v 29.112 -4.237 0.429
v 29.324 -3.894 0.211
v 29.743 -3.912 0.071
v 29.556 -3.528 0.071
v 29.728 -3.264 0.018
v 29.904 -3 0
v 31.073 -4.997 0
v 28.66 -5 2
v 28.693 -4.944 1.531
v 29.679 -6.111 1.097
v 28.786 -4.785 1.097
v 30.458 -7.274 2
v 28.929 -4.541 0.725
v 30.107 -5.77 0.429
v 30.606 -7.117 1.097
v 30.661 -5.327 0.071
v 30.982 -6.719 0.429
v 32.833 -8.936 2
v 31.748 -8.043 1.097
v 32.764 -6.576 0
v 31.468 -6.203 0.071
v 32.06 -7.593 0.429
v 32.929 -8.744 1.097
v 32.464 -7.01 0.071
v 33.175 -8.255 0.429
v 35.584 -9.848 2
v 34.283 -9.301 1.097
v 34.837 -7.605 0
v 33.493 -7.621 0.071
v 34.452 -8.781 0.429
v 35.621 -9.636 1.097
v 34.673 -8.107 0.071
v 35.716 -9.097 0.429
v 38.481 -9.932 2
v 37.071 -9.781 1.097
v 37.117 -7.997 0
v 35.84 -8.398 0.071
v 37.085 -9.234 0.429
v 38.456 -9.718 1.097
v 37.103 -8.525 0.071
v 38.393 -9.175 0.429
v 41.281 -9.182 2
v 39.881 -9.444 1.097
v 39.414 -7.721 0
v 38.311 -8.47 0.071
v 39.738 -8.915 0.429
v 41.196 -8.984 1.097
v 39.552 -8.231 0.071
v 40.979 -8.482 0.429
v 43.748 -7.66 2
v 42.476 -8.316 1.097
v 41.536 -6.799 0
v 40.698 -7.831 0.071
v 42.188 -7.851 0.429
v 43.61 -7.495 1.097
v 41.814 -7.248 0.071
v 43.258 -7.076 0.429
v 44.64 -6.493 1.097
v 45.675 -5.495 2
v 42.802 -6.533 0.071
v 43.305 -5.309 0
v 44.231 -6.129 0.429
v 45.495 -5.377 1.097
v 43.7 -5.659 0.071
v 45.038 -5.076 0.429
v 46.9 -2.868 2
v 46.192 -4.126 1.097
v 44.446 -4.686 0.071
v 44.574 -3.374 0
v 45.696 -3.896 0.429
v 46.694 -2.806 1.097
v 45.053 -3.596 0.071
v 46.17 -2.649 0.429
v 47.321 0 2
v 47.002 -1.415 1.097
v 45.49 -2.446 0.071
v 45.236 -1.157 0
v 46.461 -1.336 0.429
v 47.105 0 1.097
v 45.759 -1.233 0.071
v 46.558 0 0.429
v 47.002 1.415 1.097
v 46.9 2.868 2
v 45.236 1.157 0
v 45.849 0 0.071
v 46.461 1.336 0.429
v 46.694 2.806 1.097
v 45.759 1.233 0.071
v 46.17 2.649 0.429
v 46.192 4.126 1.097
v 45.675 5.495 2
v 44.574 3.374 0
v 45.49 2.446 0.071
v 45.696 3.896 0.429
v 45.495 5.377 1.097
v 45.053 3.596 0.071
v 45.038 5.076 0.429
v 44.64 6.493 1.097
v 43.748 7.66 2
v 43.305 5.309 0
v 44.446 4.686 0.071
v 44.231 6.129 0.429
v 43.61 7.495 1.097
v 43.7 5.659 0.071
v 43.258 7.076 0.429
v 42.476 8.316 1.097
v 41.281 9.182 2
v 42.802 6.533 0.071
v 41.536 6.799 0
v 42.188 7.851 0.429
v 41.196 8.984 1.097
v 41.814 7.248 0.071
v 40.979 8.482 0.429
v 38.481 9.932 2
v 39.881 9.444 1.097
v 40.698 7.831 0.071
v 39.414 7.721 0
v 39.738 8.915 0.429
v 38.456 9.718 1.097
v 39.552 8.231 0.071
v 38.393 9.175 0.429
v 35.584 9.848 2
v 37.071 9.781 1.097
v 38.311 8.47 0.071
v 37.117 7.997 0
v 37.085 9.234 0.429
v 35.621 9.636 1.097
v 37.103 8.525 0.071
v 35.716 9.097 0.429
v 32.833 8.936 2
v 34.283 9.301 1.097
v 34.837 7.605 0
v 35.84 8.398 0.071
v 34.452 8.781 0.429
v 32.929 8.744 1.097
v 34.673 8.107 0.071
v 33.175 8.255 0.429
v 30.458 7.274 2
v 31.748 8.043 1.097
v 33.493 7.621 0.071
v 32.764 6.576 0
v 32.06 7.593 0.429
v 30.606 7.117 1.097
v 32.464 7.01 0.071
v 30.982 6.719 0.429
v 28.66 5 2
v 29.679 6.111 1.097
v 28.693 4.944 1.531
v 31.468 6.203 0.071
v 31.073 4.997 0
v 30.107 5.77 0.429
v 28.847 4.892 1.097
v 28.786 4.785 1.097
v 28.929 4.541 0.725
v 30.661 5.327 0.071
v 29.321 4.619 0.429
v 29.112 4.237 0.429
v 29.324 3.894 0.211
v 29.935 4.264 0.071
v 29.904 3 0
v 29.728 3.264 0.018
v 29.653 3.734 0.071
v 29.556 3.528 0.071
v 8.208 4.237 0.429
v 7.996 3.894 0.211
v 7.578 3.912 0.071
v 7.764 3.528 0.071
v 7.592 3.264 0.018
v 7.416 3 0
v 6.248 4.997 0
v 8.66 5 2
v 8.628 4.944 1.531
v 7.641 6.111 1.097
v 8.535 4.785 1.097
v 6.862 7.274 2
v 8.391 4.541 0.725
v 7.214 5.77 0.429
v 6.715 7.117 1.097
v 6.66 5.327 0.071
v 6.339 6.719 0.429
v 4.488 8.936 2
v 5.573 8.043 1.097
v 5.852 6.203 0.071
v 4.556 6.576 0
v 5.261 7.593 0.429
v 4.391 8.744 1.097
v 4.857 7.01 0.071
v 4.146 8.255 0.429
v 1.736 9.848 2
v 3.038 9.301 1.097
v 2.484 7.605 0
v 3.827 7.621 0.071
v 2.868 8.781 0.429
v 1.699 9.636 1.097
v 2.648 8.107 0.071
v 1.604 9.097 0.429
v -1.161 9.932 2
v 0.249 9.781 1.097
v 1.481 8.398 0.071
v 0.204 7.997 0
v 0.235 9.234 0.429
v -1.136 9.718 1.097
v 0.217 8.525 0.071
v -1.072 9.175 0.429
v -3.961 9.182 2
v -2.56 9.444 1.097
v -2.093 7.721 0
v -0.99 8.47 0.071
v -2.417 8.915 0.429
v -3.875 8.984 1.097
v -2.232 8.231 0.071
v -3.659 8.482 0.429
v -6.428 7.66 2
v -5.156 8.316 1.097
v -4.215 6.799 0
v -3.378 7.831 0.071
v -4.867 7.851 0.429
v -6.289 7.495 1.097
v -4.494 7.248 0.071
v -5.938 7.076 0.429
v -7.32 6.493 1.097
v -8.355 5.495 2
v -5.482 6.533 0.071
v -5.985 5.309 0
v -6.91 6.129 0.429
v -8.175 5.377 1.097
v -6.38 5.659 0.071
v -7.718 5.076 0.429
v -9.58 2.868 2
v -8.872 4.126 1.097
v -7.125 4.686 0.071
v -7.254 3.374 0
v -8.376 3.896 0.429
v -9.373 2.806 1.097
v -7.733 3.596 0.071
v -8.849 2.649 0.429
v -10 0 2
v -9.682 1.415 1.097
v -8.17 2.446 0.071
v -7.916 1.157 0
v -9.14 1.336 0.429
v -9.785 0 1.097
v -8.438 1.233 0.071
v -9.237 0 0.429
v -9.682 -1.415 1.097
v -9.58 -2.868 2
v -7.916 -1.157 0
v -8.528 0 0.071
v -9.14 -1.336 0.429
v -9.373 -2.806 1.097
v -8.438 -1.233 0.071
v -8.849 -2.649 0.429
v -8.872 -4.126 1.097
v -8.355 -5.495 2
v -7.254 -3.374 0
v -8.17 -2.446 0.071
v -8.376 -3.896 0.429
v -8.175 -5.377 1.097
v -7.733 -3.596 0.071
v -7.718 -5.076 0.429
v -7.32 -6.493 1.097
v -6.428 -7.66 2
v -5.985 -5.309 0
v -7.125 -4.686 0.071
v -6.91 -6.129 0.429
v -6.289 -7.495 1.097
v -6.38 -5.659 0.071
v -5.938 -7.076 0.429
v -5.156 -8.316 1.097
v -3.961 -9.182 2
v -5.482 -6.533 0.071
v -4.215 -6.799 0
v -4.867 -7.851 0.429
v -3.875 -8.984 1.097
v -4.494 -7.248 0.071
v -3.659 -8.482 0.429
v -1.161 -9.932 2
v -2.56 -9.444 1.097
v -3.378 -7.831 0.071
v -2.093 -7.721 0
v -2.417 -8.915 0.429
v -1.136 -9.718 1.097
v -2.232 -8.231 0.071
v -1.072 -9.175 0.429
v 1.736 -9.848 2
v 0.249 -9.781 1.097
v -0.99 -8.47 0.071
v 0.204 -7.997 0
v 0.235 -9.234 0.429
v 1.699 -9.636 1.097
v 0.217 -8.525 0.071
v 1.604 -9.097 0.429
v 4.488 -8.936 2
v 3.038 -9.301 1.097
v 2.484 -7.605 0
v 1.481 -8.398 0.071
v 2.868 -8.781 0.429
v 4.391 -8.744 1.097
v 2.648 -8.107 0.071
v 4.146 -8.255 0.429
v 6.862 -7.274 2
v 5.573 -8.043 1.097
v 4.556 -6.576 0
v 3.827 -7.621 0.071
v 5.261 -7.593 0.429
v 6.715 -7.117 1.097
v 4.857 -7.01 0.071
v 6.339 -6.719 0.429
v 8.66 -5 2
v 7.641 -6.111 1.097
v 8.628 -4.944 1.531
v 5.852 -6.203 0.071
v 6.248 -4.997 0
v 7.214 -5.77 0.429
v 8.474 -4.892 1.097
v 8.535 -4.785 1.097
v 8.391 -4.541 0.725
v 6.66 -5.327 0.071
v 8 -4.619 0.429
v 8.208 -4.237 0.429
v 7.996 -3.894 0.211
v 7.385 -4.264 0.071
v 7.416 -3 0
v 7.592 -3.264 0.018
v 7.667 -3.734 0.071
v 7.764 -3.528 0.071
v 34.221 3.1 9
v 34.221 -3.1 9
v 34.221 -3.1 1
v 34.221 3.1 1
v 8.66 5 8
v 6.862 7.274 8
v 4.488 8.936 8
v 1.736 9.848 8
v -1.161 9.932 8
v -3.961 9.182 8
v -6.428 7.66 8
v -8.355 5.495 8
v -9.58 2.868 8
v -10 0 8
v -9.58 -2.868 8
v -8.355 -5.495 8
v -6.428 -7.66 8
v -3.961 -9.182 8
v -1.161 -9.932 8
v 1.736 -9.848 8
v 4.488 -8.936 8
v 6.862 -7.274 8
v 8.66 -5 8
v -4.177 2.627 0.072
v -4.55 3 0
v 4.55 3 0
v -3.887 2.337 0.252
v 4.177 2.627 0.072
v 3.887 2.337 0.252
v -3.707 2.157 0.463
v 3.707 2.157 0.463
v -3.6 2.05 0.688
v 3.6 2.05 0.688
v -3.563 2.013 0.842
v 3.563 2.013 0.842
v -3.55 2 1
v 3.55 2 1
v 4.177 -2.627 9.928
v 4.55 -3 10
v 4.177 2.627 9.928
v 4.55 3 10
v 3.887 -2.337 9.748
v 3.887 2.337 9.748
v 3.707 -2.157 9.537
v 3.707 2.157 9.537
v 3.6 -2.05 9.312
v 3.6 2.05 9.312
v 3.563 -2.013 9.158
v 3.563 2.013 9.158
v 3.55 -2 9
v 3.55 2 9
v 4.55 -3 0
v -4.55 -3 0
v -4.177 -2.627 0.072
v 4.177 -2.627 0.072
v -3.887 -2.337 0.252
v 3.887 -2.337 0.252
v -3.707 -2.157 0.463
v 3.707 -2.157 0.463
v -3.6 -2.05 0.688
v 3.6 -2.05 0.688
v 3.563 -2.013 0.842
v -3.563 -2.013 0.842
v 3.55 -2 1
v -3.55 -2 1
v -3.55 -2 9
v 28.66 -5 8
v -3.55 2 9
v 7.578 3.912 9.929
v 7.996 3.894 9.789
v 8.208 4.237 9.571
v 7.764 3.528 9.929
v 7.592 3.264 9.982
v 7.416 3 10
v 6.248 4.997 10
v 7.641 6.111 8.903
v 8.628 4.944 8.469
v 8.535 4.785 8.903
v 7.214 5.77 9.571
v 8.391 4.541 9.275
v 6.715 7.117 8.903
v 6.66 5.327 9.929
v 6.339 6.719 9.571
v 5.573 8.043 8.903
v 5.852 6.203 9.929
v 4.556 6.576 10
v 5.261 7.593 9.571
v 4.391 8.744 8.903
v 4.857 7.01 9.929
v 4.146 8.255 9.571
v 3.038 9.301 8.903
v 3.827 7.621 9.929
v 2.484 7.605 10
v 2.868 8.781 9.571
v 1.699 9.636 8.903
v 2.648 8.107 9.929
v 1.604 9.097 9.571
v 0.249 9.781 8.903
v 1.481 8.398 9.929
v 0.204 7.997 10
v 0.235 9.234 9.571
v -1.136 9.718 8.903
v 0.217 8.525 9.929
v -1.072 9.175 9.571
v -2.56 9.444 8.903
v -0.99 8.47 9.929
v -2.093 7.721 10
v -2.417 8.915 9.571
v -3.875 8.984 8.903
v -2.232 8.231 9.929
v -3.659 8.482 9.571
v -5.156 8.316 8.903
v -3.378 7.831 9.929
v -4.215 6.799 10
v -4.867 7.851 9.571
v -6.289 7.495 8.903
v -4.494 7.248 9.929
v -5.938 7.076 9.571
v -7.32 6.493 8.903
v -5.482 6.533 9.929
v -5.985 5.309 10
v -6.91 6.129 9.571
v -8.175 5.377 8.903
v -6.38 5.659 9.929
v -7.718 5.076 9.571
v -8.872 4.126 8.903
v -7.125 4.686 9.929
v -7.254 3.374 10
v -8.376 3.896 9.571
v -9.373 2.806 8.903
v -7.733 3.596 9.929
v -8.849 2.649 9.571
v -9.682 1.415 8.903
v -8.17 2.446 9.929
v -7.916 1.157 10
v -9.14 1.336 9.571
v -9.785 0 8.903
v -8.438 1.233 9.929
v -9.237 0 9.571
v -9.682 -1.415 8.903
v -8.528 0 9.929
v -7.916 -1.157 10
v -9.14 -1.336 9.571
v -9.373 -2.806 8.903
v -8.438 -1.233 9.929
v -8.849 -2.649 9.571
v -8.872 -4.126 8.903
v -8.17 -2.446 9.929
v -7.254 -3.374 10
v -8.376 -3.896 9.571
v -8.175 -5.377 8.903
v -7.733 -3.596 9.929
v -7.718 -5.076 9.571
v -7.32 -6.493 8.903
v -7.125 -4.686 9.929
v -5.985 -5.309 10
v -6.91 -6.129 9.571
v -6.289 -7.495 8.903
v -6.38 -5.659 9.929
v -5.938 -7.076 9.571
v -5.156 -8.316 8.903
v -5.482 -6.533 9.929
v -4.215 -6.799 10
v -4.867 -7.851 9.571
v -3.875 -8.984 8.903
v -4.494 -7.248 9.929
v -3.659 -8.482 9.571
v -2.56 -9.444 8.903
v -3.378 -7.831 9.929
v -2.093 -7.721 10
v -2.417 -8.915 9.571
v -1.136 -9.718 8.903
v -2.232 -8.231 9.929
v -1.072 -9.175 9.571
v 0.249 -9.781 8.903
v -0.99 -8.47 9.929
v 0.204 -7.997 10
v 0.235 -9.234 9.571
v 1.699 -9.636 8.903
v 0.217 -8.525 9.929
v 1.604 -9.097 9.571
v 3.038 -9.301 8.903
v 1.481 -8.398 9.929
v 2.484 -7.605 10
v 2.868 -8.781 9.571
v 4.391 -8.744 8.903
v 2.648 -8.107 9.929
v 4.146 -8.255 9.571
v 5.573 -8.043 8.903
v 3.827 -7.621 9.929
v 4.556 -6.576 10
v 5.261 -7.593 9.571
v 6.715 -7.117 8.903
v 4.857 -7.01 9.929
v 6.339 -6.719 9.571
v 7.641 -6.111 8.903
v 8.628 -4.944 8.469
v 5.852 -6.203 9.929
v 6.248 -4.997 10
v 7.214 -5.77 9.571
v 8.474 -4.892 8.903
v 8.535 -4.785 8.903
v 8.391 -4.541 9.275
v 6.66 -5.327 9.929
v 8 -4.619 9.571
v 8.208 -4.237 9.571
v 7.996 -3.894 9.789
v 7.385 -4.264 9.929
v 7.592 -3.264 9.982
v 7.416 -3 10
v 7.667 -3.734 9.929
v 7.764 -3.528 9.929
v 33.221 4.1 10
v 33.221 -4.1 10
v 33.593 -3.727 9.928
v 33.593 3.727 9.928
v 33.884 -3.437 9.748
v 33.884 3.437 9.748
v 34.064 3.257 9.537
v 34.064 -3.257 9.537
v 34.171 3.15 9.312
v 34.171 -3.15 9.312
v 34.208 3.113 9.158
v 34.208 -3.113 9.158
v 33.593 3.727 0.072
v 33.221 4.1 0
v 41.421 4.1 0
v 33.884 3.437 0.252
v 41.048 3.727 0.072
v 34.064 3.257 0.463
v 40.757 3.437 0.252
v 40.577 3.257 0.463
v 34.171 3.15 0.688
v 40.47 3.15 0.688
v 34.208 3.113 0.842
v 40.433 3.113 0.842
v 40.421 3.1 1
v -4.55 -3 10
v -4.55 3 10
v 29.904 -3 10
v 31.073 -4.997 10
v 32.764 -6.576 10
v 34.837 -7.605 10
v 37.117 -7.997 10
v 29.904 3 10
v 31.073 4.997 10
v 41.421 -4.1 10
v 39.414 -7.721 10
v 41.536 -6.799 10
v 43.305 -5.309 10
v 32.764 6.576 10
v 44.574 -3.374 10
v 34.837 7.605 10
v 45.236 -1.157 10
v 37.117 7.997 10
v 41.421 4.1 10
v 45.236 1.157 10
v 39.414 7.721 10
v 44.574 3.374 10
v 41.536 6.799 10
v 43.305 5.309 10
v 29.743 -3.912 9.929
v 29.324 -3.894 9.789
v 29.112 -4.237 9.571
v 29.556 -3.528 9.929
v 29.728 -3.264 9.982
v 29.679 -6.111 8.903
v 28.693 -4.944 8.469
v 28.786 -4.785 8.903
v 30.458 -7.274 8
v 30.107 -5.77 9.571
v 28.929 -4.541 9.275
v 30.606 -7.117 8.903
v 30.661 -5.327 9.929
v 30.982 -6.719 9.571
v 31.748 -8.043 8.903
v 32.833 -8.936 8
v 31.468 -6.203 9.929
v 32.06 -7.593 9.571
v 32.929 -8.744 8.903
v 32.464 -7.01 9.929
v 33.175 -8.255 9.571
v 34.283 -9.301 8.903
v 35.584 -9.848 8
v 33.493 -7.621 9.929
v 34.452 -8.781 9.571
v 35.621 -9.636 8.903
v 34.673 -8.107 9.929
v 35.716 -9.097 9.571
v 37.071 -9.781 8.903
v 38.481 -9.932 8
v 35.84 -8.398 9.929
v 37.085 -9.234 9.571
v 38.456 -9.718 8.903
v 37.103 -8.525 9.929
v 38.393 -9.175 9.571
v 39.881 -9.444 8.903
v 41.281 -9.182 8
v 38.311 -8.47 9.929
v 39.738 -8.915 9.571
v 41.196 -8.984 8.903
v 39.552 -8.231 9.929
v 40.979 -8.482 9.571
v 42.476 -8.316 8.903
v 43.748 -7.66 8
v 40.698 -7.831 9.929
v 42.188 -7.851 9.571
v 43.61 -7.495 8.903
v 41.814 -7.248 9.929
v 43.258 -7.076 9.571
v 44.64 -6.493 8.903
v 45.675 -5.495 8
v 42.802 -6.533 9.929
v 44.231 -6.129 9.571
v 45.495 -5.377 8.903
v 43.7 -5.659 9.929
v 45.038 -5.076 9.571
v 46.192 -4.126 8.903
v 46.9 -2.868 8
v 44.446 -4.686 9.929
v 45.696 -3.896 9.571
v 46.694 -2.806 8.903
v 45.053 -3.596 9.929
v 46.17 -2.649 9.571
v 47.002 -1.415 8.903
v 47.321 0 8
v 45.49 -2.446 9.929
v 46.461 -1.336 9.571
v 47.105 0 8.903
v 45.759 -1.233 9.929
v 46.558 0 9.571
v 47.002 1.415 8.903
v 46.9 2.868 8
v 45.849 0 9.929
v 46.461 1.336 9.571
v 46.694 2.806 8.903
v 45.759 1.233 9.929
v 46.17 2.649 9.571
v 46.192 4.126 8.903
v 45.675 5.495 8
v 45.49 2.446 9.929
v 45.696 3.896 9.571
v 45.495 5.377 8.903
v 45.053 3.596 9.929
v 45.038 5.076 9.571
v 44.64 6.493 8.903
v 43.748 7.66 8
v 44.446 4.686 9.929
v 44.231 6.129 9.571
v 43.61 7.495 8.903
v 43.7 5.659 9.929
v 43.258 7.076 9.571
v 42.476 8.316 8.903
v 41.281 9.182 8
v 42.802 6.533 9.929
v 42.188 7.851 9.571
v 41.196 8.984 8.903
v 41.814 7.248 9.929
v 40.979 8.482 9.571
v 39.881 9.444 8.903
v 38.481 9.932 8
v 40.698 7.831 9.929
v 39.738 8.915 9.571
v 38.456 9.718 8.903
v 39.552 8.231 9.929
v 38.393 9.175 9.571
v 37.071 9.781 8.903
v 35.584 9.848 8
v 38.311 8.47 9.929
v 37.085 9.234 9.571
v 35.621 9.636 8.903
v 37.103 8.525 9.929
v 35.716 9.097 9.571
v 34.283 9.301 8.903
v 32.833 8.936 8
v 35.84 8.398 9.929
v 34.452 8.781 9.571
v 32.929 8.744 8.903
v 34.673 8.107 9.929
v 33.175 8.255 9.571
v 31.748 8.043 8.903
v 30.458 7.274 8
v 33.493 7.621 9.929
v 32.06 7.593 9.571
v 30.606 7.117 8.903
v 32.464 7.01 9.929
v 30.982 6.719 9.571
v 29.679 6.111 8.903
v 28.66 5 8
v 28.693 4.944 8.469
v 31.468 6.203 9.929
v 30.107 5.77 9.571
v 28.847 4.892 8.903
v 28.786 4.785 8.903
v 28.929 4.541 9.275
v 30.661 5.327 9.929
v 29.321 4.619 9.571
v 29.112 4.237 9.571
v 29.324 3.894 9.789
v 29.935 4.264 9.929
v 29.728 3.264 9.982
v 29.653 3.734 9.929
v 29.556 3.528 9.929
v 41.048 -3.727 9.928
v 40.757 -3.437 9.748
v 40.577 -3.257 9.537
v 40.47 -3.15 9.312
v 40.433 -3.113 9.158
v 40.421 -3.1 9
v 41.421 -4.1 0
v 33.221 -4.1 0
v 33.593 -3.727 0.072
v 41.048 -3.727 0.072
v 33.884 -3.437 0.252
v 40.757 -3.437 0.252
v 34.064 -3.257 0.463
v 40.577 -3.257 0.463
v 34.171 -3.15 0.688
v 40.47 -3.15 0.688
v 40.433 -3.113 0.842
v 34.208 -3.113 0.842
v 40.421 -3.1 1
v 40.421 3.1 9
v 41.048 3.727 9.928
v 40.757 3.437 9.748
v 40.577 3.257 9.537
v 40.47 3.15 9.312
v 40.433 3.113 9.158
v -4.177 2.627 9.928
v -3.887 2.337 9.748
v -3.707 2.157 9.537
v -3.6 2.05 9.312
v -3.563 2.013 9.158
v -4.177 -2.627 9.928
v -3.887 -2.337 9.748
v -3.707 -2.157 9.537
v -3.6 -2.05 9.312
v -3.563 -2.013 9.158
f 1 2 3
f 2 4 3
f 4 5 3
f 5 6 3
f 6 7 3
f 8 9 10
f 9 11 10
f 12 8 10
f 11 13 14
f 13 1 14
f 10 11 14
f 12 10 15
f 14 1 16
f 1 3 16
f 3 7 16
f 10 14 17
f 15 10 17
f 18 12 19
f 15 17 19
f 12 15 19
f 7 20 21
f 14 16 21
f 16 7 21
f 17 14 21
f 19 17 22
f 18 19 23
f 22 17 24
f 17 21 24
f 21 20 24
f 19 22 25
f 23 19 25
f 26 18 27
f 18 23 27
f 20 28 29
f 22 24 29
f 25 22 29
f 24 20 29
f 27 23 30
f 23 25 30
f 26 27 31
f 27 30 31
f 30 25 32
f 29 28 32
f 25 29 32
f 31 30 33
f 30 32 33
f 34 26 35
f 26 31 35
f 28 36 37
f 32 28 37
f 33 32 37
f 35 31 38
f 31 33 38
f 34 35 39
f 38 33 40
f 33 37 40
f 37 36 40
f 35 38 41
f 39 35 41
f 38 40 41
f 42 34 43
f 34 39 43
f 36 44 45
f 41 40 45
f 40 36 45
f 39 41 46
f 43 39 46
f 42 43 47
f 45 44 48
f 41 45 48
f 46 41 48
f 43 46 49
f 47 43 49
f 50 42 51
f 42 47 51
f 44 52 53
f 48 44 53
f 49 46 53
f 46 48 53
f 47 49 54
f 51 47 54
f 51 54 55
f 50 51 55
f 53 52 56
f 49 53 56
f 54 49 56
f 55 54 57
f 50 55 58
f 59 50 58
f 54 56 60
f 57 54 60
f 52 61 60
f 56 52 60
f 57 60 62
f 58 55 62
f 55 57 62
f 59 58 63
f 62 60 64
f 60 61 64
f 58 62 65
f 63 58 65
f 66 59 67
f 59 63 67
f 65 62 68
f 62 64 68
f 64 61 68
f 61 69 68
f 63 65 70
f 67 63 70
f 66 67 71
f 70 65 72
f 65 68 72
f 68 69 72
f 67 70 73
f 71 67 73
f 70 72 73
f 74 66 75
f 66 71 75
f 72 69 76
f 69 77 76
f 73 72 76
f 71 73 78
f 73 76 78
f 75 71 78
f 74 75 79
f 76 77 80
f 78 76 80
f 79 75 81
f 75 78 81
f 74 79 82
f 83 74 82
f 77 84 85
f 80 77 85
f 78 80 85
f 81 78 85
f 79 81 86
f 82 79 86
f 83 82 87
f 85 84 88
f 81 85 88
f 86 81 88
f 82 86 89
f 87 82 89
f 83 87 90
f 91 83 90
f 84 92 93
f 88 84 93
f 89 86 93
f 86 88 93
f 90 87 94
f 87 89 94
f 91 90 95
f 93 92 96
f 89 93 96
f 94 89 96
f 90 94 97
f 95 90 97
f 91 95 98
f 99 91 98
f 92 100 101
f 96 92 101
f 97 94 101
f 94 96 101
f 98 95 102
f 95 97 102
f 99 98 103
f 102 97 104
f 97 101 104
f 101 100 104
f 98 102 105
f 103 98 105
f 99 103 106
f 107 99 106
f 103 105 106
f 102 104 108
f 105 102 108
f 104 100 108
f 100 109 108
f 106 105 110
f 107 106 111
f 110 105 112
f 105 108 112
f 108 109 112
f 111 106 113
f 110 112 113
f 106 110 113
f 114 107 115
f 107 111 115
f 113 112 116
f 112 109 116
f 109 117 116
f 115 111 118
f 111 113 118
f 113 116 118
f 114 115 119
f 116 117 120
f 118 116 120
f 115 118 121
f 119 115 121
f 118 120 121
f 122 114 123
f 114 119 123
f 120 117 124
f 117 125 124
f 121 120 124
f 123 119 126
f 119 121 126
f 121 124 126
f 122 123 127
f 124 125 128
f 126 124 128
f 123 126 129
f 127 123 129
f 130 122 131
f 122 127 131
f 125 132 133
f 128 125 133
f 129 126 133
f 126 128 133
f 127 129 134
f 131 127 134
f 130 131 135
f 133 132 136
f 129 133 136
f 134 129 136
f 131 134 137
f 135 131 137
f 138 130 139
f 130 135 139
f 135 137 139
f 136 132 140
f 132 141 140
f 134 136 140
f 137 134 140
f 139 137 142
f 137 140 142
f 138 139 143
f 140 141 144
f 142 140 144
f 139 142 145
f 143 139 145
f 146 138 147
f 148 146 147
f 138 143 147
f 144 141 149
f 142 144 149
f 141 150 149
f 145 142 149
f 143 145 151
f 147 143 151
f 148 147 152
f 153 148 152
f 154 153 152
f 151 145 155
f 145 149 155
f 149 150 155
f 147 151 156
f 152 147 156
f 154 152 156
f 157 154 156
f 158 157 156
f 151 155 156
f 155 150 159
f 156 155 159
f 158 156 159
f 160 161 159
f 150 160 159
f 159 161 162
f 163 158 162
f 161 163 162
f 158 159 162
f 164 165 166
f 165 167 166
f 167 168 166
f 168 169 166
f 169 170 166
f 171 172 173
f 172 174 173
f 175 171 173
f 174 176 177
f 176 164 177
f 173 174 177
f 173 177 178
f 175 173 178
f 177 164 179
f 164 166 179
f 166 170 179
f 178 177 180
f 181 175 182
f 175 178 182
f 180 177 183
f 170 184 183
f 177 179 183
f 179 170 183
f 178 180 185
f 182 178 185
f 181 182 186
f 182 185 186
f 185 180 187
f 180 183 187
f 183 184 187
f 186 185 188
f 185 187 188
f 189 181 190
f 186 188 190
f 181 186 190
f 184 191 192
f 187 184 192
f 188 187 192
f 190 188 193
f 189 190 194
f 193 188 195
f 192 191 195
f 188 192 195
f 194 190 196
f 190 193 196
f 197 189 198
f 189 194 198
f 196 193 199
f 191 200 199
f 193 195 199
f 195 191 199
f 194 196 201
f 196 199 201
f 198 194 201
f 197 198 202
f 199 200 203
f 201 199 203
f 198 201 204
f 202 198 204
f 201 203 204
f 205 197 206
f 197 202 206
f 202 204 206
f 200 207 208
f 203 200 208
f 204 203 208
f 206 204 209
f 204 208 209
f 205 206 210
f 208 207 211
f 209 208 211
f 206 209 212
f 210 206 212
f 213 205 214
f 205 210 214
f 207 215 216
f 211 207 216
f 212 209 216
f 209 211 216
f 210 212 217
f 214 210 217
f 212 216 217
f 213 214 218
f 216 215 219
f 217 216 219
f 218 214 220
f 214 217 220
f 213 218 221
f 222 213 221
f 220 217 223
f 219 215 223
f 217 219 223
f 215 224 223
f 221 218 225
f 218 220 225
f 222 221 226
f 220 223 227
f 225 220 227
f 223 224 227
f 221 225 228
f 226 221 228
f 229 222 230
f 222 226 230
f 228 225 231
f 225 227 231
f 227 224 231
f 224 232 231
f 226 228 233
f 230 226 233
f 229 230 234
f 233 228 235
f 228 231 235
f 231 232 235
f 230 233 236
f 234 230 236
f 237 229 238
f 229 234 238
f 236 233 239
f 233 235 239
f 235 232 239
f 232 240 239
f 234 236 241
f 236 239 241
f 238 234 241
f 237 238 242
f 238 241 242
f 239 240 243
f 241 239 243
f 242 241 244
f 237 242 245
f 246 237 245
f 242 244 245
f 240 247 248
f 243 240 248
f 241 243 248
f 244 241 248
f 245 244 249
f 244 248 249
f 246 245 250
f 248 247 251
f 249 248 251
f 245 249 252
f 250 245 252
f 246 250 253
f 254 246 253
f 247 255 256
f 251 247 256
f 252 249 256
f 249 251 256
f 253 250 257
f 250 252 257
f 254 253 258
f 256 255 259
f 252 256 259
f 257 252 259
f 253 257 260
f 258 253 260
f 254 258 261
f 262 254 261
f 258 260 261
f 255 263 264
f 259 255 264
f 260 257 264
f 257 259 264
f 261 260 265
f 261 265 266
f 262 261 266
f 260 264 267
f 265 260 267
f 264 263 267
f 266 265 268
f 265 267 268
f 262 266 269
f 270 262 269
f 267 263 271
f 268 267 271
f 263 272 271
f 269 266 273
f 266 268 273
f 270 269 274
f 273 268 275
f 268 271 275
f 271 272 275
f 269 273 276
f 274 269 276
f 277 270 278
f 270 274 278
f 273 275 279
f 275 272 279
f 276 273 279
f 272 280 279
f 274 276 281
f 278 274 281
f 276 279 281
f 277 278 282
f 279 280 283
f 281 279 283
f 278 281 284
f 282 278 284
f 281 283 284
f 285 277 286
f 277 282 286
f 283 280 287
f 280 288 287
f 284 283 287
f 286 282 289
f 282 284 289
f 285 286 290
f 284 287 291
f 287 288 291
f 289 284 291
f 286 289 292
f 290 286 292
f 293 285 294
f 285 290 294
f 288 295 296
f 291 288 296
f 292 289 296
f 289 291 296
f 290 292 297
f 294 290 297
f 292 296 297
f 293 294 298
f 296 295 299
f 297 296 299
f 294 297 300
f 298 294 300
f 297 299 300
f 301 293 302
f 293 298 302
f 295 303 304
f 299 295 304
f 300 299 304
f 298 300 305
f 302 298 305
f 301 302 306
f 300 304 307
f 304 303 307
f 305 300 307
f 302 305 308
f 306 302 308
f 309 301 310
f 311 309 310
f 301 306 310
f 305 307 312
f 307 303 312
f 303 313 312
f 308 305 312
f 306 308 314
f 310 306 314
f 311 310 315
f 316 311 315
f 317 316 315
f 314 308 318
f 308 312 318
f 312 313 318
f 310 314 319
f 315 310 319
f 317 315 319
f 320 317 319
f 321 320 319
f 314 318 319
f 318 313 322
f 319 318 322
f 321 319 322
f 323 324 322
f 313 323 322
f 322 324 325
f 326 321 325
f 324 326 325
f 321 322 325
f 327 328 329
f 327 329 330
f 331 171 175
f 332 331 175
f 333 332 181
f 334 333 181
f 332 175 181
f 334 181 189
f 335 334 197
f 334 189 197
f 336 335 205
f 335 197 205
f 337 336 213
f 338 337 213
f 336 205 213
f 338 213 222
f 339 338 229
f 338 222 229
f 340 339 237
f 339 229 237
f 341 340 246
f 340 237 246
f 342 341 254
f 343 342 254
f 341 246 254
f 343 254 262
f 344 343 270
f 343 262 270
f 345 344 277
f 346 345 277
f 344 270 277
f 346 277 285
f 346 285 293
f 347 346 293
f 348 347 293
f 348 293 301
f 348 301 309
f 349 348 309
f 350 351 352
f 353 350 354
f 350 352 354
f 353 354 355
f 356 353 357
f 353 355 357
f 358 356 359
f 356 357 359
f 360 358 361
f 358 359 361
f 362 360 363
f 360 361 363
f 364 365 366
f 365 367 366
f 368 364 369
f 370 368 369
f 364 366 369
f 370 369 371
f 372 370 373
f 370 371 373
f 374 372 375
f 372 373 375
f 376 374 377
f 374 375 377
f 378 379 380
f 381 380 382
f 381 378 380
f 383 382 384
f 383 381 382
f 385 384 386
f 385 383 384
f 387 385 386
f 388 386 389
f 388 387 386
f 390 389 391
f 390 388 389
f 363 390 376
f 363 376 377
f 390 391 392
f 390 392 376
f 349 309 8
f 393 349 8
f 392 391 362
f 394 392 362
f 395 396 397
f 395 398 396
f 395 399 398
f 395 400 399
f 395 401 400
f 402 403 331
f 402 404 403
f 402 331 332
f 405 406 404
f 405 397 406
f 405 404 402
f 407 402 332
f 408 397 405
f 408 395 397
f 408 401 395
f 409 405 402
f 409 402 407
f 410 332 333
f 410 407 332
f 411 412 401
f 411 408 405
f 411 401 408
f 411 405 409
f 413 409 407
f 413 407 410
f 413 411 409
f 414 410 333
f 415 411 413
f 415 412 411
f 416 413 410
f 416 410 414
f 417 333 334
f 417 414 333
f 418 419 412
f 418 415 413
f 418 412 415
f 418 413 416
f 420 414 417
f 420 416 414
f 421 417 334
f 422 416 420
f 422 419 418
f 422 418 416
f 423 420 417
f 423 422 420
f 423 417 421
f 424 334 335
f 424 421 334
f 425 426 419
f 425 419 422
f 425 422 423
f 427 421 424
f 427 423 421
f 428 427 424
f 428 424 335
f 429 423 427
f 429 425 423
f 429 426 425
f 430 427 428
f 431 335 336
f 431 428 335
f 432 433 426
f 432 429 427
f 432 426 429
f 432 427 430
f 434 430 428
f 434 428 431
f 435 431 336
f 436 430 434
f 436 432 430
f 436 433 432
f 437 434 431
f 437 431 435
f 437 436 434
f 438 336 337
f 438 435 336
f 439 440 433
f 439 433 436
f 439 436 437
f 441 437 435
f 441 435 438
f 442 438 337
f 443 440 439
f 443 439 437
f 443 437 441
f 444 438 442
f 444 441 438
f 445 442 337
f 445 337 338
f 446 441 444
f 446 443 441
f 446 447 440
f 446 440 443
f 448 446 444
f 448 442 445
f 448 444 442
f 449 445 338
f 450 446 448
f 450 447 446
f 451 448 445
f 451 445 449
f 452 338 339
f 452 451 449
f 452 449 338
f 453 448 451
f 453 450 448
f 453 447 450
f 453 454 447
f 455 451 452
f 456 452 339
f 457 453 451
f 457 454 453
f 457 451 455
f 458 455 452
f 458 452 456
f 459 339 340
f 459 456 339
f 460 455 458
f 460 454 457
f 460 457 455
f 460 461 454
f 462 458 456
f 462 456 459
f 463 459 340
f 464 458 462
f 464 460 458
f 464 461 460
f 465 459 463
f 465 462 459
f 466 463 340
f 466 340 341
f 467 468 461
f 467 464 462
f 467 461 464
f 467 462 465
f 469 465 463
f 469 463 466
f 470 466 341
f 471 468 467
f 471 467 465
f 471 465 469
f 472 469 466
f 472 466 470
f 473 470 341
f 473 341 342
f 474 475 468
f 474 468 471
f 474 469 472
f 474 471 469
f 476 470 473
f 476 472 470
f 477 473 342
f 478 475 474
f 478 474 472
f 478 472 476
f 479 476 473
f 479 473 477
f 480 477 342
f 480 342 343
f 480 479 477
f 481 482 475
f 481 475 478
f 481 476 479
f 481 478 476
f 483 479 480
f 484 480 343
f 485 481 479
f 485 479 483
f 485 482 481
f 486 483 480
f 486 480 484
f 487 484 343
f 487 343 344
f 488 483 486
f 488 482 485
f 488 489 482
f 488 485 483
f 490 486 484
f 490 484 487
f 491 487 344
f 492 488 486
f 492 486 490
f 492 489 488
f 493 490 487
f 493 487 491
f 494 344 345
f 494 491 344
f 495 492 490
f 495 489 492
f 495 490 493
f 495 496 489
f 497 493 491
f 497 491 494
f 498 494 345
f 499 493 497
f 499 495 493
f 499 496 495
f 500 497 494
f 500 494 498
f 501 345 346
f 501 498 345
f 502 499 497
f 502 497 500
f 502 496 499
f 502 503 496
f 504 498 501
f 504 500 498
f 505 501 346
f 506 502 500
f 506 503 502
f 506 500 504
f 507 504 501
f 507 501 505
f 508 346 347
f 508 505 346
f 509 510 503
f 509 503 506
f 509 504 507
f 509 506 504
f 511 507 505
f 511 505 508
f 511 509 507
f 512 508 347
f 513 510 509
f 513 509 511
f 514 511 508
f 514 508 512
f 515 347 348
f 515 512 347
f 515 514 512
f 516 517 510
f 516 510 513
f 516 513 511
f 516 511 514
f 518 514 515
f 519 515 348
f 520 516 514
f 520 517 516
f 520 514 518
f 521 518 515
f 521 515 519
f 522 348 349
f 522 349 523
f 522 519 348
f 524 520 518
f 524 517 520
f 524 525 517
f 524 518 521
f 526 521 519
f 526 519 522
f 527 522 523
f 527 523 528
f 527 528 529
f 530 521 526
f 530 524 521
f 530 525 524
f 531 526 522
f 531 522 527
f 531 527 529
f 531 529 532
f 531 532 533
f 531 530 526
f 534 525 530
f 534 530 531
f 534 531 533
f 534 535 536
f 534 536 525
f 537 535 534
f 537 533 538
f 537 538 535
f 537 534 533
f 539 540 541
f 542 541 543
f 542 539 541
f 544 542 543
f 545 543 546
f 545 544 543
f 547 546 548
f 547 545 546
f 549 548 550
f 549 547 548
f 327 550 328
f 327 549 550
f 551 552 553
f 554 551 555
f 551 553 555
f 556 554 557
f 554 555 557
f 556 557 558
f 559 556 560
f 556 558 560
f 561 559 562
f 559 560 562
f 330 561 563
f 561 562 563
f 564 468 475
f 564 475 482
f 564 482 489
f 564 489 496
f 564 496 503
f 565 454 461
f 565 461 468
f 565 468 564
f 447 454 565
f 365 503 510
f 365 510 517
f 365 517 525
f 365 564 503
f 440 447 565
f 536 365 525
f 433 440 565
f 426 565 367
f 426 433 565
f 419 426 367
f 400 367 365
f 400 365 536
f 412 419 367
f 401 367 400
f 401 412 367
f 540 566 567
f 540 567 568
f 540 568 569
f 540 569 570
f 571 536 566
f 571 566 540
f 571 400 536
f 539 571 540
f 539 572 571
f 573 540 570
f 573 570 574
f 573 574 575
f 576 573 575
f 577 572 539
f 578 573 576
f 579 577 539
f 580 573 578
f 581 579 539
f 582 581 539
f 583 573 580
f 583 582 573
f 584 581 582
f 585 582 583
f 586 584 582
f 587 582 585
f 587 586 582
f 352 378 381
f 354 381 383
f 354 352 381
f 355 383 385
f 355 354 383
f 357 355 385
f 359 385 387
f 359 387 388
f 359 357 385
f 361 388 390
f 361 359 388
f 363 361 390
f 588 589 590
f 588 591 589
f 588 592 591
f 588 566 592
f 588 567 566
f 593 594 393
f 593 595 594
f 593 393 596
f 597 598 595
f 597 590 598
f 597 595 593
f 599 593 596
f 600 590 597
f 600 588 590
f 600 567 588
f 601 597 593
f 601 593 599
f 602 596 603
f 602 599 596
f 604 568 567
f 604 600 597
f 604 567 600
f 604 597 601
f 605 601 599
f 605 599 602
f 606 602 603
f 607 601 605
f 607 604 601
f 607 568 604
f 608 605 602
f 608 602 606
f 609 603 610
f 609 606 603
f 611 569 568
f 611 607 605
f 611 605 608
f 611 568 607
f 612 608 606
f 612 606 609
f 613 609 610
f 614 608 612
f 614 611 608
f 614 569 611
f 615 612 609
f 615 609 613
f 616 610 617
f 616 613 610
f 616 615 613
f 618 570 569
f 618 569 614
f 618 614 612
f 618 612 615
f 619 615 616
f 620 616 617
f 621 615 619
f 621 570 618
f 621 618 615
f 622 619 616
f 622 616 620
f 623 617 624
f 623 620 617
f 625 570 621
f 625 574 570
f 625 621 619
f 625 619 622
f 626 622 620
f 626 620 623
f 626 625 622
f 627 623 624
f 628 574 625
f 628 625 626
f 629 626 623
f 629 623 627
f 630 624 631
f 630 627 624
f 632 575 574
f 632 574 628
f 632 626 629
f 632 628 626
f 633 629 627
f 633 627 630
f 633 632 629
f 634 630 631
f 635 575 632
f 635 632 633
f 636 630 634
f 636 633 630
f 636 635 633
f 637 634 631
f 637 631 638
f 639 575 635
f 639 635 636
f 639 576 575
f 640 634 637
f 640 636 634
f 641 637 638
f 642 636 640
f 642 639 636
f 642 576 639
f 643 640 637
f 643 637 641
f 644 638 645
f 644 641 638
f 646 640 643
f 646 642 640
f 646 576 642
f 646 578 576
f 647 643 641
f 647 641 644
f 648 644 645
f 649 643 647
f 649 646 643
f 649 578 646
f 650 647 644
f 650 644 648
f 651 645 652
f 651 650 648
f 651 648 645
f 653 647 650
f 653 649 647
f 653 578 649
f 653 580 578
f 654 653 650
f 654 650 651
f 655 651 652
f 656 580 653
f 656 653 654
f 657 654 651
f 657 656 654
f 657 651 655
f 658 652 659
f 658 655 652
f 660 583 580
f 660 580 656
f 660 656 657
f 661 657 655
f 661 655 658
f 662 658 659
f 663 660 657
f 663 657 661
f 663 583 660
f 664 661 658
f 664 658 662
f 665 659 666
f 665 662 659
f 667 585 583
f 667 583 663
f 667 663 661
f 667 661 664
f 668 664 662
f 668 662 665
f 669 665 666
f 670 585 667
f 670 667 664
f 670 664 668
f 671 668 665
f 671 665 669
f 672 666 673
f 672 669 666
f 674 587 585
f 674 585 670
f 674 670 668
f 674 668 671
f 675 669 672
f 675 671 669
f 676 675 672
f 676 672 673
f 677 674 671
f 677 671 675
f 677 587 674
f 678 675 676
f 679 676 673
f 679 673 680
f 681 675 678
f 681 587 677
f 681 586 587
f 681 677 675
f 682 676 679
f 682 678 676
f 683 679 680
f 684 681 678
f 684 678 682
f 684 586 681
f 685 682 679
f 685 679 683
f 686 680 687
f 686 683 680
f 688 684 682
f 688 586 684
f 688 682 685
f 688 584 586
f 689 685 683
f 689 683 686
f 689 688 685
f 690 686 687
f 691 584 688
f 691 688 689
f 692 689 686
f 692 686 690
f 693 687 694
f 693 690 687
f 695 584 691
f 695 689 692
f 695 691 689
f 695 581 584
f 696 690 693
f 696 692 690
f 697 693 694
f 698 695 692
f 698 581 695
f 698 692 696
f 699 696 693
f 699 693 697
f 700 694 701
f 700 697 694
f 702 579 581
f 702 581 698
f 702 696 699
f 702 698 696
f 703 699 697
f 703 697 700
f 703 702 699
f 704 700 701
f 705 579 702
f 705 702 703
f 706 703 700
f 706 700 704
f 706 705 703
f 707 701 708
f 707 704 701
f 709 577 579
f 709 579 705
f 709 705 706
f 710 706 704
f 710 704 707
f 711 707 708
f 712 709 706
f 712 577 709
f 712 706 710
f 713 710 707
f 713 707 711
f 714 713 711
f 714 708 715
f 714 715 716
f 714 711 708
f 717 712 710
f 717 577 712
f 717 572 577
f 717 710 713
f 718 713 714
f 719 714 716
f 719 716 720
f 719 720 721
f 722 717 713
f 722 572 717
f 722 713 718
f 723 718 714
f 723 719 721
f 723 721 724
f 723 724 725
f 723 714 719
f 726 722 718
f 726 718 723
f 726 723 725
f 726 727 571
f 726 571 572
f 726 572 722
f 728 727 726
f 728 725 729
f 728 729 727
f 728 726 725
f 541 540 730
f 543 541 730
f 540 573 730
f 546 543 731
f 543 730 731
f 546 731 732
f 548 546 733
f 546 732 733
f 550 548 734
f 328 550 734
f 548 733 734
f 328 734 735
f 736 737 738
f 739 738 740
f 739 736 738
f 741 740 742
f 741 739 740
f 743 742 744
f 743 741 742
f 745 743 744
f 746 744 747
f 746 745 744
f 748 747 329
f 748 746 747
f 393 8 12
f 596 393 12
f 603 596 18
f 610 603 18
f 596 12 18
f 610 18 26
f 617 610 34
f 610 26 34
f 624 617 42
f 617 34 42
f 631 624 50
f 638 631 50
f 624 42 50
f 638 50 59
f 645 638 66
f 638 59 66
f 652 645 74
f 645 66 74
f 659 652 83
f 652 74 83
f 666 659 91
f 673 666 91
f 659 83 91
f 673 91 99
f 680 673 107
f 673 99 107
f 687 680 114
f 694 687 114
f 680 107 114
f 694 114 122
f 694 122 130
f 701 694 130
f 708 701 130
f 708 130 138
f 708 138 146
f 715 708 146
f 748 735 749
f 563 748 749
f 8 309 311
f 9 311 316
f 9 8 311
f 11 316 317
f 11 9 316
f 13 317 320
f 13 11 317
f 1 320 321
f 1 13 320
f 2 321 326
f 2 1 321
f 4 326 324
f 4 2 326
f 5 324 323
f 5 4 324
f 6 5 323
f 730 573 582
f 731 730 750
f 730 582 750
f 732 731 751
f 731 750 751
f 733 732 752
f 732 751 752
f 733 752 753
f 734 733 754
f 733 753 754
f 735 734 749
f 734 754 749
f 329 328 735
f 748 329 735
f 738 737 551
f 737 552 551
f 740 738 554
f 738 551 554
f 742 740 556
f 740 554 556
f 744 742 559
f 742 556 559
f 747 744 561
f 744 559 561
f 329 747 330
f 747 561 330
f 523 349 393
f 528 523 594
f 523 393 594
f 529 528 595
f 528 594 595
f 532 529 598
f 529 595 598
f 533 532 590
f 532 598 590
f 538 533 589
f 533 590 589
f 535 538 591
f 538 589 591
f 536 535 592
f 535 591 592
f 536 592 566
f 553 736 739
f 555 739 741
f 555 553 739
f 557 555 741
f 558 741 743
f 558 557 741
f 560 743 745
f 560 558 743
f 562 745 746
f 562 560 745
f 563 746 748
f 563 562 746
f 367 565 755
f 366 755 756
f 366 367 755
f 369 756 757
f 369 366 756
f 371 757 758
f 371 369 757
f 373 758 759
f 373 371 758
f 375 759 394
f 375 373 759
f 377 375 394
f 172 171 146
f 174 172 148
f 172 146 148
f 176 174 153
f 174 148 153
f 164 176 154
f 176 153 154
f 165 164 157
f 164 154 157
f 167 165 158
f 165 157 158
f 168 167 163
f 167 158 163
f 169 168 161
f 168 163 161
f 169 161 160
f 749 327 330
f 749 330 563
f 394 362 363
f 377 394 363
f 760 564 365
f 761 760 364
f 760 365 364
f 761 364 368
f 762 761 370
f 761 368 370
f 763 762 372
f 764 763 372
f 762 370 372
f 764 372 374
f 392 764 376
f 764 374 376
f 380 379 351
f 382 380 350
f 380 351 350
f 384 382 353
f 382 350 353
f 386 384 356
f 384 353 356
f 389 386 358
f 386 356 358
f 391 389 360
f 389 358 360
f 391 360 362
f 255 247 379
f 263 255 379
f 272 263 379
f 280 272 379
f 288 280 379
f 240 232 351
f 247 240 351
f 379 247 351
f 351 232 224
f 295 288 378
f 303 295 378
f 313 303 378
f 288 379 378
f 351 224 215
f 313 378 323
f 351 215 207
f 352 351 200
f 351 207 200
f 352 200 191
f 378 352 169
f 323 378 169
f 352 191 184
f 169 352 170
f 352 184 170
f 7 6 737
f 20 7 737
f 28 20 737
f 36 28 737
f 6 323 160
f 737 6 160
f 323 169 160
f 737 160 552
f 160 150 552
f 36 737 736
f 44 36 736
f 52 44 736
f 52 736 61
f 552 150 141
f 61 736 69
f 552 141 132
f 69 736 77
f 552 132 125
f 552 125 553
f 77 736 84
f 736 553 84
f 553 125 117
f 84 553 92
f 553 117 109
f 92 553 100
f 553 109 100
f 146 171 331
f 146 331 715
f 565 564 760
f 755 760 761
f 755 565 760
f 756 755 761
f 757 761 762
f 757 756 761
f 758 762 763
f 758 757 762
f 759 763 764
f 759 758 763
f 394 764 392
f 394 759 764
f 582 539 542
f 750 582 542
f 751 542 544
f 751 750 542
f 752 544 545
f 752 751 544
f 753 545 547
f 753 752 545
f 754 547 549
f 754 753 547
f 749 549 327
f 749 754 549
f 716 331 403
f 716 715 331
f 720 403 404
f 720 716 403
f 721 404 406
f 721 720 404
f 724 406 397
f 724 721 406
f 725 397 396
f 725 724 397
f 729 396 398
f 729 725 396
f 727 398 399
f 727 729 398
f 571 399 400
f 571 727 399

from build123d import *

# Parameters (mm, degrees)
SKETCH_W    = 7.1
SKETCH_H    = 4
SKETCH_W_2  = 6.2
SKETCH_H_2  = 6.2
PAD_DEPTH   = 10
FILLET_R    = 2
FILLET001_R = 1


with BuildPart() as part:
    # Sketch → Pad (new body)
    with BuildSketch(Plane.XY):
        with BuildLine():
            ThreePointArc((8.660254, 5), (-10, 0), (8.660254, -5))
            Line((8.660254, -5), (28.660254, -5))
            ThreePointArc((28.660254, -5), (47.320508, 0), (28.660254, 5))
            Line((8.660254, 5), (28.660254, 5))
        make_face()
        Rectangle(SKETCH_W, SKETCH_H, mode=Mode.SUBTRACT)
        with Locations((37.320508, 0)):
            Rectangle(SKETCH_W_2, SKETCH_H_2, mode=Mode.SUBTRACT)
    extrude(amount=PAD_DEPTH)

    # Fillet
    fillet_edges = [part.edges().sort_by_distance(p)[0] for p in [
        (-10, 0, 10),
        (18.660254, -5, 10),
        (18.660254, 5, 10),
        (47.320508, 0, 10),
        (-10, 0, 0),
        (18.660254, -5, 0),
        (47.320508, 0, 0),
        (18.660254, 5, 0),
    ]]
    fillet(fillet_edges, radius=FILLET_R)

    # Fillet001
    fillet001_edges = [part.edges().sort_by_distance(p)[0] for p in [
        (0, -2, 0),
        (-3.55, 0, 0),
        (0, 2, 0),
        (3.55, 0, 0),
        (0, 2, 10),
        (0, -2, 10),
        (3.55, 0, 10),
        (-3.55, 0, 10),
        (37.320508, 3.1, 10),
        (34.220508, 0, 10),
        (37.320508, -3.1, 10),
        (40.420508, 0, 10),
        (37.320508, -3.1, 0),
        (40.420508, 0, 0),
        (37.320508, 3.1, 0),
        (34.220508, 0, 0),
    ]]
    fillet(fillet001_edges, radius=FILLET001_R)


solid = part.part
